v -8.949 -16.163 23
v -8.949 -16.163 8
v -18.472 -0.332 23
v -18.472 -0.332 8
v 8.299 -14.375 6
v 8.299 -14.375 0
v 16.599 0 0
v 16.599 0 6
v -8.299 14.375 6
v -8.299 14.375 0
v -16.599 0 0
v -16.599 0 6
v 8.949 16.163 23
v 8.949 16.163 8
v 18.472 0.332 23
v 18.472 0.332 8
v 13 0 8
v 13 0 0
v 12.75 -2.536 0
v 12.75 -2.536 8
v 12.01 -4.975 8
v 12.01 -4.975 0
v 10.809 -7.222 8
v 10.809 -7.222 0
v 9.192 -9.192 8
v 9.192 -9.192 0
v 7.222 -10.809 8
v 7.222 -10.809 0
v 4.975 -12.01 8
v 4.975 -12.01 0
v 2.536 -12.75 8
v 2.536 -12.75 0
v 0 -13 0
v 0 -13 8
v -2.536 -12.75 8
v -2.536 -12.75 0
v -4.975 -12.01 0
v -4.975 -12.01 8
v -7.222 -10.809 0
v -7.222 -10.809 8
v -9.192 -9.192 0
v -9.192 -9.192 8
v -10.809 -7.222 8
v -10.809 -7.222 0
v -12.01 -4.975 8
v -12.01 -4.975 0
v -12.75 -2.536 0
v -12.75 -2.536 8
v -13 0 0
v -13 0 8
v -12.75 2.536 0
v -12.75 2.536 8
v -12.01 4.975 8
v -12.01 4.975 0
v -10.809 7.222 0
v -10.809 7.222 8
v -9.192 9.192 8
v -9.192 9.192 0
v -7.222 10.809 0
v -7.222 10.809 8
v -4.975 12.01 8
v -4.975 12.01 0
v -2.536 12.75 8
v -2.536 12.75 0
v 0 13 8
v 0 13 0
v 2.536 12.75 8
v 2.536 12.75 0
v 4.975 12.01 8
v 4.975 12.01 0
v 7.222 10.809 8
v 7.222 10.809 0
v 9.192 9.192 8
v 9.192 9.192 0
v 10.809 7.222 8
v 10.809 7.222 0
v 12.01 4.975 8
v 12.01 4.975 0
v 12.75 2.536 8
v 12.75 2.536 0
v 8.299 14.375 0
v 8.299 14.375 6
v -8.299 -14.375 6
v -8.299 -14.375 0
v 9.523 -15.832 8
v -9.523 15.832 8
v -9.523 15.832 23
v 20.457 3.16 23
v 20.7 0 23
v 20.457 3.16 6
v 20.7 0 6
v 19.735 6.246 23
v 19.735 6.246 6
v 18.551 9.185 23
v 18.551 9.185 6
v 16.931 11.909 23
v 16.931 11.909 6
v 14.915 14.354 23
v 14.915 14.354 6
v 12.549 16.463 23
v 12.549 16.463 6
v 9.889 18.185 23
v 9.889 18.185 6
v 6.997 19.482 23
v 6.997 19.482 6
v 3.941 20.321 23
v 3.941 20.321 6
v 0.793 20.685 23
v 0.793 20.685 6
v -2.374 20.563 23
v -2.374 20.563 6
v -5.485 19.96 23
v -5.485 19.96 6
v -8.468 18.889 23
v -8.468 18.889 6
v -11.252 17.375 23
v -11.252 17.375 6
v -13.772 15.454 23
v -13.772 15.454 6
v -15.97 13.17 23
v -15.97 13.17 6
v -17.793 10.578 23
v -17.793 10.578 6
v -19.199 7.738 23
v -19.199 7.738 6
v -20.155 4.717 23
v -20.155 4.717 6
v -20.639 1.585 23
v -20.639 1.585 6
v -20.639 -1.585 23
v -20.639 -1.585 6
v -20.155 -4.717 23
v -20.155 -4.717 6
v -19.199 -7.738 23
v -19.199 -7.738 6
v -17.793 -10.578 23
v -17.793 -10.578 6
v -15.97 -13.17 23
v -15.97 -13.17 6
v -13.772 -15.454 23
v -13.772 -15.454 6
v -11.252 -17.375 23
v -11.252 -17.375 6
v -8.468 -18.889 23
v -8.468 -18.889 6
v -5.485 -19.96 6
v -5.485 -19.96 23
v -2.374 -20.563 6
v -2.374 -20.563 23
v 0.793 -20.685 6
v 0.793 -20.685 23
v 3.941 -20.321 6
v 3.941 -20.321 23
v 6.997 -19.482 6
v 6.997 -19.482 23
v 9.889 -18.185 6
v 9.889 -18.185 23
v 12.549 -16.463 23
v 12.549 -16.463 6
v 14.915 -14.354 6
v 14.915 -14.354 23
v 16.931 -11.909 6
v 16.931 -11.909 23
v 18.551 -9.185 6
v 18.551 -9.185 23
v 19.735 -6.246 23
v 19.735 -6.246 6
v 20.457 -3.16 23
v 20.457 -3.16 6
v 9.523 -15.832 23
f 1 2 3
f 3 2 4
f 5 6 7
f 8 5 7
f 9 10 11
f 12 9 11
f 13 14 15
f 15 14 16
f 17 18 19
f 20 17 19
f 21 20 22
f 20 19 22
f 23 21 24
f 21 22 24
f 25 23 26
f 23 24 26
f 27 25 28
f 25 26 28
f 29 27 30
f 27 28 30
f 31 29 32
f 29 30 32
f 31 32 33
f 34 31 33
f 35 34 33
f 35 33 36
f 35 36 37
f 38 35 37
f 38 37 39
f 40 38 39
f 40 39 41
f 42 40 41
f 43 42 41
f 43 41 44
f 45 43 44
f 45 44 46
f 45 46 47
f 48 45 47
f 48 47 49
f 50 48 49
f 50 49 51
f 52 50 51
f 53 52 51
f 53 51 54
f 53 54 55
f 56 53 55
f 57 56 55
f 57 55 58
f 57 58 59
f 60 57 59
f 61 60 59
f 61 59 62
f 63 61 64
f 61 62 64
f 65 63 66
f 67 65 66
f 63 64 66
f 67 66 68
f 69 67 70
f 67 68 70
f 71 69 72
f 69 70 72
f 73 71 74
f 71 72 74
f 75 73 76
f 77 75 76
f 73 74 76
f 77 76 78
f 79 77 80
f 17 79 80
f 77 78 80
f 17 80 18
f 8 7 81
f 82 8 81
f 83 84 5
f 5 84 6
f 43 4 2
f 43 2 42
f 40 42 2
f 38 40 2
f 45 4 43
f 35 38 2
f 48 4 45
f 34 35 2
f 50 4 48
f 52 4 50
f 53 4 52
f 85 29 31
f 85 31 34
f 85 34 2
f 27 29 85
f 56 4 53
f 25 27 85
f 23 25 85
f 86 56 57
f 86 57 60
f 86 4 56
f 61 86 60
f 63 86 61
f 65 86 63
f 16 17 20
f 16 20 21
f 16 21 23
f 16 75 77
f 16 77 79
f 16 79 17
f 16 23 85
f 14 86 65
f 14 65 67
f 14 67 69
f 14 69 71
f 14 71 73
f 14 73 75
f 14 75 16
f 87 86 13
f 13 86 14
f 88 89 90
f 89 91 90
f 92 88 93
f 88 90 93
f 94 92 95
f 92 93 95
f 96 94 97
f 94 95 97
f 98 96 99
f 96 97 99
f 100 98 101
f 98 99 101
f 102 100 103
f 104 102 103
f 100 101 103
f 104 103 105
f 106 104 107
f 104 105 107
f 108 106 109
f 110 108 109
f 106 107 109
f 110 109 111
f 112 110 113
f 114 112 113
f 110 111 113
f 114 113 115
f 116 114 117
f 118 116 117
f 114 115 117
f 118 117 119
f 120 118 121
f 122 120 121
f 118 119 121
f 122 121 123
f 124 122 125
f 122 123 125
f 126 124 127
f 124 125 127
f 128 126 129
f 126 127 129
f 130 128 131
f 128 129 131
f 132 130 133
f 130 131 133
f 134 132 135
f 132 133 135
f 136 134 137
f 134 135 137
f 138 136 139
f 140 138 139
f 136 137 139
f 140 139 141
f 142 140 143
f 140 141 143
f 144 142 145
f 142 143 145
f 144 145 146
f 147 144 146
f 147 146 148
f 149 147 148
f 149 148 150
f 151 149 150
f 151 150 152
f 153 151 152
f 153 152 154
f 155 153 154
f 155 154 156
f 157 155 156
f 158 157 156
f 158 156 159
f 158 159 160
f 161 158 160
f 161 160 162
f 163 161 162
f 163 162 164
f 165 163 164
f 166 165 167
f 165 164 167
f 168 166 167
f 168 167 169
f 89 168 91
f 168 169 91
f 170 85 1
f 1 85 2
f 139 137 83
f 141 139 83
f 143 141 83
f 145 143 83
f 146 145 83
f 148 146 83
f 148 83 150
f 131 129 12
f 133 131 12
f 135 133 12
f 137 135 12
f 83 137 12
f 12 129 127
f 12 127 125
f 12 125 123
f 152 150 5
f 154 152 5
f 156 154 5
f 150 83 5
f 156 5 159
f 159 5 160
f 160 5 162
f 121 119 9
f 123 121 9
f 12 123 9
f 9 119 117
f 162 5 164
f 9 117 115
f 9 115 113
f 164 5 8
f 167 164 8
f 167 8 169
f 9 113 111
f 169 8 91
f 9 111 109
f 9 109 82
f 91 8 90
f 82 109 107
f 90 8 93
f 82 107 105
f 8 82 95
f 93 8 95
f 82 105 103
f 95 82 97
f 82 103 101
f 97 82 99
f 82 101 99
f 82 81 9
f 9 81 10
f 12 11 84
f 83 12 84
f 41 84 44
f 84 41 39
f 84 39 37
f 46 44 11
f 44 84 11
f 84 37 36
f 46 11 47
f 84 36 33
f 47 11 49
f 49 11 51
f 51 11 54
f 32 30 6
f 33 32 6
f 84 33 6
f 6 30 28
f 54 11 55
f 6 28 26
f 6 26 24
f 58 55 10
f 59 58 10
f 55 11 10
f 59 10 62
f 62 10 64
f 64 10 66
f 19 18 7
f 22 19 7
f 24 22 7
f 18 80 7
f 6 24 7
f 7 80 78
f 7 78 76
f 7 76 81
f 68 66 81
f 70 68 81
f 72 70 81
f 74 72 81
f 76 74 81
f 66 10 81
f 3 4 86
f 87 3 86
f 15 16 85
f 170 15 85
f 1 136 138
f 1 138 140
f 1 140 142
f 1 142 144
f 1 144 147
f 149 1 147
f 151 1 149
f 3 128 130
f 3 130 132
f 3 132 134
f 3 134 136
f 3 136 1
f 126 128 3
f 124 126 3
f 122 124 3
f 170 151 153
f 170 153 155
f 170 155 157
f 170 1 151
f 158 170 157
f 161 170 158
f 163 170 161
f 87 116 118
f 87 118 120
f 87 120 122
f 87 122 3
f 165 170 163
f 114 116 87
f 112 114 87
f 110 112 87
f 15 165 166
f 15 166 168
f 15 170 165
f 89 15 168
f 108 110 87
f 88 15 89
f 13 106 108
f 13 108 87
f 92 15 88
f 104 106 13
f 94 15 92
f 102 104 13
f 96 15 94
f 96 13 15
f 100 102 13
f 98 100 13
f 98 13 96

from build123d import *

# Parameters (mm, degrees)
F1_DEPTH = 6
F2_R     = 20.7
F3_DEPTH = 2
F4_R     = 20.7
F5_DEPTH = 15
F6_R     = 13
F7_DEPTH = 25


with BuildPart() as f1:
    # F0 (on Top) → F1 (new body)
    with BuildSketch(Plane.XY):
        Polygon((8.29941, 14.375), (-8.29941, 14.375), (-16.59882, 0), (-8.29941, -14.375), (8.29941, -14.375), (16.59882, 0), align=None)
    extrude(amount=F1_DEPTH)

    # F2 (on face) → F3 (join)
    with BuildSketch(Plane.XY.offset(6)):
        Circle(F2_R)
    extrude(amount=F3_DEPTH)

    # F4 (on face) → F5 (join)
    with BuildSketch(Plane.XY.offset(8)):
        Circle(F4_R)
        Polygon((-9.523293, 15.831621), (8.948939, 16.163224), (18.472232, 0.331603), (9.523293, -15.831621), (-8.948939, -16.163224), (-18.472232, -0.331603), align=None, mode=Mode.SUBTRACT)
    extrude(amount=F5_DEPTH)

    # F6 (on face) → F7 (cut)
    with BuildSketch(Plane(origin=(0, 0, 0), x_dir=(1, 0, 0), z_dir=(0, 0, -1))):
        Circle(F6_R)
    extrude(amount=-F7_DEPTH, mode=Mode.SUBTRACT)


solid = f1.part
